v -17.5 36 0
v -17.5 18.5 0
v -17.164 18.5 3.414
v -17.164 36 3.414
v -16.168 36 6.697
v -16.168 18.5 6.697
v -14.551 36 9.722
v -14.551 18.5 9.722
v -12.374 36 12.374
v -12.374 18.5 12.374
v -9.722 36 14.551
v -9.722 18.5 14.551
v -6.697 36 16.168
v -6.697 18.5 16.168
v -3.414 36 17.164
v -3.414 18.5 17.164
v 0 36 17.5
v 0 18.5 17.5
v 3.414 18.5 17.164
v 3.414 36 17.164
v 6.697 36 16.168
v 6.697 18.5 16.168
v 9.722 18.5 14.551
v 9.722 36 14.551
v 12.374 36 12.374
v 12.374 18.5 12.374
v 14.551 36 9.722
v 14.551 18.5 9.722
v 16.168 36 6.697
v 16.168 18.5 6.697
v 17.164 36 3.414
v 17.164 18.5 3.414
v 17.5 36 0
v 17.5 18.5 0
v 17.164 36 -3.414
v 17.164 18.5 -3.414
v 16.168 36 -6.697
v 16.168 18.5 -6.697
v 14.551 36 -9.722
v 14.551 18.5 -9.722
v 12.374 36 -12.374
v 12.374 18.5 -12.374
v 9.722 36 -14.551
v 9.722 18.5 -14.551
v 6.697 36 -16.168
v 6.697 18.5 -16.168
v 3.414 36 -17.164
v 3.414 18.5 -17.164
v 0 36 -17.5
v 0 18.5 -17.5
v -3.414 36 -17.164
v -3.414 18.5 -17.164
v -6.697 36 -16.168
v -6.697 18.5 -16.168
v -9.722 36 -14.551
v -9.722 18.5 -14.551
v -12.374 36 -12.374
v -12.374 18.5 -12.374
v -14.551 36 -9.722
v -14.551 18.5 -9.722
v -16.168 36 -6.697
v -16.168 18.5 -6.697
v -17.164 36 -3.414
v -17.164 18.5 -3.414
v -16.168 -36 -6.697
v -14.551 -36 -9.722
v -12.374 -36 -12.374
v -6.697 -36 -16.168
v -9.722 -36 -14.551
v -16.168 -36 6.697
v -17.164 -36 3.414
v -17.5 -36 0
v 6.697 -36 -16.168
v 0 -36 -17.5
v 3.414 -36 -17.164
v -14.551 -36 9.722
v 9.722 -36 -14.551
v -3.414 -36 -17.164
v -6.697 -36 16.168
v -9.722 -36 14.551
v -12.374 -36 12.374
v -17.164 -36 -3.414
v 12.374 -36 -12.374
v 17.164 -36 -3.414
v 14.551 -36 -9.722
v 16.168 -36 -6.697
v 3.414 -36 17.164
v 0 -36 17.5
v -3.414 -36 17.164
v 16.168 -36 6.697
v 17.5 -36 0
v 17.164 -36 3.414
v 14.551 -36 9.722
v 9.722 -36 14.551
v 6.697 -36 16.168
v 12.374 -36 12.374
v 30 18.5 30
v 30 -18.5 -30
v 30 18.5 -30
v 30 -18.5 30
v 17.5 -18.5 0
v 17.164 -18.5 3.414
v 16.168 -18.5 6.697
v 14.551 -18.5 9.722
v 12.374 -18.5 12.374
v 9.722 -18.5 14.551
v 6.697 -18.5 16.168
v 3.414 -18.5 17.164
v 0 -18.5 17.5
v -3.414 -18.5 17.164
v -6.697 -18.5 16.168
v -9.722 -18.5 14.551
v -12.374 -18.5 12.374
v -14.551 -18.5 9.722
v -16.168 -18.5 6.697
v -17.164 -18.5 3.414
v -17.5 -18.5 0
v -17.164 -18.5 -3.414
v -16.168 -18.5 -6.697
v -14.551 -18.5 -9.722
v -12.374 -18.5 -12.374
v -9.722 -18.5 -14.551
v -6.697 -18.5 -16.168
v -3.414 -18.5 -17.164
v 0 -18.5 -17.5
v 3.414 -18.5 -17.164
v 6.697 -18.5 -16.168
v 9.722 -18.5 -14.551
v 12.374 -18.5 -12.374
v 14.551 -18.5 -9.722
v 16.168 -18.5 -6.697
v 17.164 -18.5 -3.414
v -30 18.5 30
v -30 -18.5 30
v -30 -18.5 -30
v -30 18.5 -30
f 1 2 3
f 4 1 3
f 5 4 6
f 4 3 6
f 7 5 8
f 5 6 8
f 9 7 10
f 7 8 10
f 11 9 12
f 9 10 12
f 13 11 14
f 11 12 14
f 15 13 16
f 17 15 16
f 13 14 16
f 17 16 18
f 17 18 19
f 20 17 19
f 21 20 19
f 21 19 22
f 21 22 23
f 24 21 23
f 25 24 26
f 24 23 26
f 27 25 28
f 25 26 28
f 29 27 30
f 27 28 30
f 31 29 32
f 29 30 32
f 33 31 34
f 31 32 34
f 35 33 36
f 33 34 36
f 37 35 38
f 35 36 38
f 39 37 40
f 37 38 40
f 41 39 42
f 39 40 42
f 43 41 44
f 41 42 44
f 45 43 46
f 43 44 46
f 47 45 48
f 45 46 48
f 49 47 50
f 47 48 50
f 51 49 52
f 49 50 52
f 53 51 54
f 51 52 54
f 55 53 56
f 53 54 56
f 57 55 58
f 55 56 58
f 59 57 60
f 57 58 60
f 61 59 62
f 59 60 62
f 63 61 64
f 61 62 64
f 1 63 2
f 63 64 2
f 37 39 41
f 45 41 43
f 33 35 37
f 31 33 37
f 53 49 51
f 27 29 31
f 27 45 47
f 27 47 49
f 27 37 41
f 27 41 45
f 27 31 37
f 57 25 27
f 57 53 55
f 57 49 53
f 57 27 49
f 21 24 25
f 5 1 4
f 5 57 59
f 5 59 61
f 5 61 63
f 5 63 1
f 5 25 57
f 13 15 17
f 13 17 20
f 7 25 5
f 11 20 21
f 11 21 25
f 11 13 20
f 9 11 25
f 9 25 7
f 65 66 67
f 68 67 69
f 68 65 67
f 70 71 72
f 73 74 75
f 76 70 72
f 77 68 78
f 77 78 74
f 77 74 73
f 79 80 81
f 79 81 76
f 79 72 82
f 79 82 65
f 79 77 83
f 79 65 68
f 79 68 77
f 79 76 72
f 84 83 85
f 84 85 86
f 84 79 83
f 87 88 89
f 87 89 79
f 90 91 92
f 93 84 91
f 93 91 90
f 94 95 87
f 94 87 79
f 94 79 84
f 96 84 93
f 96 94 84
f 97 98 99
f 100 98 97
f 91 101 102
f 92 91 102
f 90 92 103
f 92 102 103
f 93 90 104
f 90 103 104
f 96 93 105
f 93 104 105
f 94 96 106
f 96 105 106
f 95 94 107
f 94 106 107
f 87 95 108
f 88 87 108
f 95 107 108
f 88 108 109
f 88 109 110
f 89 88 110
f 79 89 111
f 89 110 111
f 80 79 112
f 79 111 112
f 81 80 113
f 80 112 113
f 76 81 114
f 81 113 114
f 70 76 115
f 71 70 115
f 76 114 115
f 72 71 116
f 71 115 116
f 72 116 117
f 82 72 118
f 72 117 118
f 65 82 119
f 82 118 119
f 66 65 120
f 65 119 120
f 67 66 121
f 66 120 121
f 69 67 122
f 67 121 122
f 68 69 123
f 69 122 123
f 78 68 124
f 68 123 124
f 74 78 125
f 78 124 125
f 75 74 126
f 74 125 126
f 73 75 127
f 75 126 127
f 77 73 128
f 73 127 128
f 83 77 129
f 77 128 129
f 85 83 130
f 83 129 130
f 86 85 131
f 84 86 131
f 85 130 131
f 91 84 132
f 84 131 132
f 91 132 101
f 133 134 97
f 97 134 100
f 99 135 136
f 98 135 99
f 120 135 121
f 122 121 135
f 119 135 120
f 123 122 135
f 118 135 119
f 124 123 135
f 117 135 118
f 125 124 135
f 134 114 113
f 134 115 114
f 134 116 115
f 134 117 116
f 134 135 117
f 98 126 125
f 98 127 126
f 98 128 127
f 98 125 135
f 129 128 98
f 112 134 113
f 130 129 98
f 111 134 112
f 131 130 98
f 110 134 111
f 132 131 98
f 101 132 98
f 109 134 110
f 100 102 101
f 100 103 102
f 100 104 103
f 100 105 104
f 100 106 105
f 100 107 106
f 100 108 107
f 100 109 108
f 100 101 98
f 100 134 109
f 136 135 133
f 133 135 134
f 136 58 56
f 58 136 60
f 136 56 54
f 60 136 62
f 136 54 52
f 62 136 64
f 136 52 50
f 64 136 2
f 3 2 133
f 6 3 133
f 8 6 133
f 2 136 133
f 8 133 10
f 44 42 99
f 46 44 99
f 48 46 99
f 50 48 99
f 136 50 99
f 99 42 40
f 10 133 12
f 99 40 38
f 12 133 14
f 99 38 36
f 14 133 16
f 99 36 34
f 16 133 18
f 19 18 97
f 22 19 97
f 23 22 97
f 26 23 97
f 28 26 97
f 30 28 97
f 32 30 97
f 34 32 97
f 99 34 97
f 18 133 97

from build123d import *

# Parameters (mm, degrees)
F0_W     = 60
F0_H     = 60
F1_DEPTH = 18.5
F2_R     = 17.5
F4_DEPTH = 17.5
F3_R     = 17.4998645961
F5_DEPTH = 17.5


with BuildPart() as f1:
    # F0 (on Front) → F1 (new body, symmetric)
    with BuildSketch(Plane.XZ):
        Rectangle(F0_W, F0_H)
    extrude(amount=F1_DEPTH, both=True)

    # F2 (on face) → F4 (join)
    with BuildSketch(Plane.XZ.offset(18.5)):
        Circle(F2_R)
    extrude(amount=F4_DEPTH)

    # F3 (on face) → F5 (join)
    with BuildSketch(Plane(origin=(0, 18.5, 0), x_dir=(-1, 0, 0), z_dir=(0, 1, 0))):
        Circle(F3_R)
    extrude(amount=F5_DEPTH)


solid = f1.part
